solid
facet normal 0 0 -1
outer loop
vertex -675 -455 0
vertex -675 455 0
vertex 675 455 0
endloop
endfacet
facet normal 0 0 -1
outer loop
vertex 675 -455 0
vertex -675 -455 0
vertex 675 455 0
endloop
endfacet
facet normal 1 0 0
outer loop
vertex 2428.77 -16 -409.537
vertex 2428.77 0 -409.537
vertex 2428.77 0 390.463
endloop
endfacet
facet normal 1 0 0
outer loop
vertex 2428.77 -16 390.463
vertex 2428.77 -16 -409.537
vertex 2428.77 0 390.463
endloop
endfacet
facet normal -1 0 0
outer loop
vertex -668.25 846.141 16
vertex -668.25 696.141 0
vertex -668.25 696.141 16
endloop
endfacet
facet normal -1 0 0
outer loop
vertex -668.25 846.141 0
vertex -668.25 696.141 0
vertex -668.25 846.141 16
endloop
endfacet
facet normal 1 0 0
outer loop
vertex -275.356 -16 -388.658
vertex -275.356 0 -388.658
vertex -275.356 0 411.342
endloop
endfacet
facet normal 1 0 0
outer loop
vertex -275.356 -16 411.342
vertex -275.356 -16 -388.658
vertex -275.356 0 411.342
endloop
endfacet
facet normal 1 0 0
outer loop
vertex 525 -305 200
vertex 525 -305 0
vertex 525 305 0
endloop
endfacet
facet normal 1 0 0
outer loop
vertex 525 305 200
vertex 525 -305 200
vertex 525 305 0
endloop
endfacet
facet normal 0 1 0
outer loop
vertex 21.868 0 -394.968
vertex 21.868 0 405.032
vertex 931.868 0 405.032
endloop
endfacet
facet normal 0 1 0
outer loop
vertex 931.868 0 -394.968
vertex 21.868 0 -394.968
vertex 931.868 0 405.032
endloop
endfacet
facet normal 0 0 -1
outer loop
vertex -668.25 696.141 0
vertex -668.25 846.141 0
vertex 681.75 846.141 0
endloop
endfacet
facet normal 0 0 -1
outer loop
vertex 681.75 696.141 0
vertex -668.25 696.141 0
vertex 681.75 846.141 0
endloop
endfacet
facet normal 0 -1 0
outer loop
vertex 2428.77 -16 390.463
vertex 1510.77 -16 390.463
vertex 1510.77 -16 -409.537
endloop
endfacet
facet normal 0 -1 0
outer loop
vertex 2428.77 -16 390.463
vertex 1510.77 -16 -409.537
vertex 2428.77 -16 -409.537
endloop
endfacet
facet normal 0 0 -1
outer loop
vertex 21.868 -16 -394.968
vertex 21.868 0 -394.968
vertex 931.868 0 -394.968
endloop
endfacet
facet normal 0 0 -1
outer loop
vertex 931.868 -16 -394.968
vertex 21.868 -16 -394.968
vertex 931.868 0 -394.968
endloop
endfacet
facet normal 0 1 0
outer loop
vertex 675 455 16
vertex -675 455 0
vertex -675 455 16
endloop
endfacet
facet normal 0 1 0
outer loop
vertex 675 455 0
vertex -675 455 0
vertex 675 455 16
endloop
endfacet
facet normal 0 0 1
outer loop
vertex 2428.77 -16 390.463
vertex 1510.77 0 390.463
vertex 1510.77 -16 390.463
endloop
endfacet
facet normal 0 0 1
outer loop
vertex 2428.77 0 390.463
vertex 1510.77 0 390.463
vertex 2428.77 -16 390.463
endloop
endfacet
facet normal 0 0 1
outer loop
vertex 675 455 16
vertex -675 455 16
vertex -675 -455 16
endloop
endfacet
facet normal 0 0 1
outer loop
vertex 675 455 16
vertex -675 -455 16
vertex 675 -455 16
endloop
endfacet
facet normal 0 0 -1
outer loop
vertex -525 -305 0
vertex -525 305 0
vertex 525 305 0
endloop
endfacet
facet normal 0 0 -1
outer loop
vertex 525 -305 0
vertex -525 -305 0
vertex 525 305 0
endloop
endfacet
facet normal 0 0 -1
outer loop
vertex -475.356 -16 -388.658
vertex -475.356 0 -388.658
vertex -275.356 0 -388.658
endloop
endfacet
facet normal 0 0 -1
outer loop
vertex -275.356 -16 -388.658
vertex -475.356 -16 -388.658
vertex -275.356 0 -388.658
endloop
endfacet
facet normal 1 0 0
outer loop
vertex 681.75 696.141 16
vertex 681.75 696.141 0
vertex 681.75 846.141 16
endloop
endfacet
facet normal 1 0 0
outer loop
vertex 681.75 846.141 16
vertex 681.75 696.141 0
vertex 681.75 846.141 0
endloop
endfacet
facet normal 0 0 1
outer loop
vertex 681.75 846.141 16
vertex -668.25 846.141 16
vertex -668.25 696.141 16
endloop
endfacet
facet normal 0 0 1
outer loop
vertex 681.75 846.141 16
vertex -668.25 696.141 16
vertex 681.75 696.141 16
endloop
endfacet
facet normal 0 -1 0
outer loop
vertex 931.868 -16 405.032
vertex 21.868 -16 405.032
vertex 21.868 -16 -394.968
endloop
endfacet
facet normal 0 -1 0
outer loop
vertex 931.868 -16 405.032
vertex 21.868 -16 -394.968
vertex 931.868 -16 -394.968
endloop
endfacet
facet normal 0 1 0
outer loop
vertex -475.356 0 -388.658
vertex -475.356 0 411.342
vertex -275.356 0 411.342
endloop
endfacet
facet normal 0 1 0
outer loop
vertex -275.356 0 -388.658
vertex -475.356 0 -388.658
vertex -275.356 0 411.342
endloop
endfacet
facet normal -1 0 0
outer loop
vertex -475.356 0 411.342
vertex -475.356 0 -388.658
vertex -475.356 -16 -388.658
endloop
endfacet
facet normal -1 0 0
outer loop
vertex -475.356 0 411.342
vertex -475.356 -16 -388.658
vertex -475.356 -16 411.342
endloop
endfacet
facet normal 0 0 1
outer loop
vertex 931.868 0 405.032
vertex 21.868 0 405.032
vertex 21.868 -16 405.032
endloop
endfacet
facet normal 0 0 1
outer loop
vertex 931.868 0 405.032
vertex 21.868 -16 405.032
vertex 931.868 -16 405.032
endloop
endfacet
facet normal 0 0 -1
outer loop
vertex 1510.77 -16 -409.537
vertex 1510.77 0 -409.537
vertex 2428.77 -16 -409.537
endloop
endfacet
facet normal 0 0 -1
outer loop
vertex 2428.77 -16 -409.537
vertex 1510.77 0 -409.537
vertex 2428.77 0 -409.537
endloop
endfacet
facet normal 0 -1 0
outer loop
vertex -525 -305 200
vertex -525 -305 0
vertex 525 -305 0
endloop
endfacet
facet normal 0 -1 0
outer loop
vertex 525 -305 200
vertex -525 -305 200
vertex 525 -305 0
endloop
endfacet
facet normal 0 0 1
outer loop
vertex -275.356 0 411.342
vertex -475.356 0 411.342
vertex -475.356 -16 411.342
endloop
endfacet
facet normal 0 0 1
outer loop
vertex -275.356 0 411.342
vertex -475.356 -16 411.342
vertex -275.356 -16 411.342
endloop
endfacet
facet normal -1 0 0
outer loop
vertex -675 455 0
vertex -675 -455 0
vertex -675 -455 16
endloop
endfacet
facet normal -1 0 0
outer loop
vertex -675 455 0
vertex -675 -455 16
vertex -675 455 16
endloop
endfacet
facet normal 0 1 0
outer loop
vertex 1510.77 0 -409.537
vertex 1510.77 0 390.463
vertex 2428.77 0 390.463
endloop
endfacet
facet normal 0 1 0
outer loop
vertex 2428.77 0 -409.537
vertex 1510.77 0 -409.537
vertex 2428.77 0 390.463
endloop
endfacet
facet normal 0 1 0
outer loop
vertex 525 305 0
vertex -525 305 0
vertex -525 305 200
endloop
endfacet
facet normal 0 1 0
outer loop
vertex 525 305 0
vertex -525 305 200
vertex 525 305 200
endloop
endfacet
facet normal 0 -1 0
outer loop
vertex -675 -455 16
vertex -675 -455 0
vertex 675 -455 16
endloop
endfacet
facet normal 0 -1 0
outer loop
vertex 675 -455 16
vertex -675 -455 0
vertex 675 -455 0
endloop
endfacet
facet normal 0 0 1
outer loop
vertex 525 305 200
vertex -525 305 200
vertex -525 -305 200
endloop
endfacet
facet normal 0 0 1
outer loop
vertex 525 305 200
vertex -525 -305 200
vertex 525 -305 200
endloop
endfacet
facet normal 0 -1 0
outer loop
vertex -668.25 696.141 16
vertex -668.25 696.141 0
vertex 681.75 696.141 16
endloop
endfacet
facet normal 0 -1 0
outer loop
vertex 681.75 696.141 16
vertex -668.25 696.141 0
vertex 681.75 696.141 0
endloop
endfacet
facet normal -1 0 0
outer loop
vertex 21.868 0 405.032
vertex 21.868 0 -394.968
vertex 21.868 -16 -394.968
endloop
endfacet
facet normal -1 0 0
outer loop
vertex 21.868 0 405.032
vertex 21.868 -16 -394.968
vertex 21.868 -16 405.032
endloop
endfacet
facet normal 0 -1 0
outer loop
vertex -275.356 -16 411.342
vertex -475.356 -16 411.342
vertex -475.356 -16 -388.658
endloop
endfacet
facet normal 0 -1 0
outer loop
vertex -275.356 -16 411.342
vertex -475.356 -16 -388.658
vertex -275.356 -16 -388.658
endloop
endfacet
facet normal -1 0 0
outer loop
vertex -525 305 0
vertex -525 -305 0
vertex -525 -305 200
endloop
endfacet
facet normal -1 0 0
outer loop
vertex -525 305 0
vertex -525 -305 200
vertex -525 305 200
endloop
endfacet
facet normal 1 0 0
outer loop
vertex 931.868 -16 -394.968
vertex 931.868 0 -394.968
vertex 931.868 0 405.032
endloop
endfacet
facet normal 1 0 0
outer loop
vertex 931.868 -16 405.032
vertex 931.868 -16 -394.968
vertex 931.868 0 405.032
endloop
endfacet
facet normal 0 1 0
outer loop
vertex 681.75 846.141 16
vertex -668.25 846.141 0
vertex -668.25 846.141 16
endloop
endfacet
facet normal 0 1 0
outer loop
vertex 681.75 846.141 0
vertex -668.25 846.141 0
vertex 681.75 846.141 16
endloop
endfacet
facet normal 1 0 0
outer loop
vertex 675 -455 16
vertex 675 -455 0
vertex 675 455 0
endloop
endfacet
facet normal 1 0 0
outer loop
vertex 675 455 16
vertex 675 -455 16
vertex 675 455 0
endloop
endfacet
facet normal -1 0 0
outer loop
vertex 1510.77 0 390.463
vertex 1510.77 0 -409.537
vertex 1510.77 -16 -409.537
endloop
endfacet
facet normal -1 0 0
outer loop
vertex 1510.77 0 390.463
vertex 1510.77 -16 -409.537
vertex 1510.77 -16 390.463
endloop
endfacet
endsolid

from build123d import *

# Parameters (mm, degrees)
F1_W     = 1350
F1_H     = 150
F2_DEPTH = 16
F1_H_2   = 910
F1_W_2   = 1050
F1_H_3   = 610
F3_DEPTH = 16
F4_W     = 200
F4_H     = 800
F5_DEPTH = 16
F4_W_2   = 910
F6_DEPTH = 16
F4_W_3   = 918
F7_DEPTH = 16
F8_DEPTH = 200


with BuildPart() as f2:
    # F1 (on Top) → F2 (new body)
    with BuildSketch(Plane.XY):
        with Locations((6.7500948906, 771.1411237717)):
            Rectangle(F1_W, F1_H)
    extrude(amount=F2_DEPTH)


with BuildPart() as f3:
    # F1 (on Top) → F3 (new body)
    with BuildSketch(Plane.XY):
        Rectangle(F1_W, F1_H_2)
        Rectangle(F1_W_2, F1_H_3, mode=Mode.SUBTRACT)
        Rectangle(F1_W_2, F1_H_3)
    extrude(amount=F3_DEPTH)


with BuildPart() as f5:
    # F4 (on Front) → F5 (new body)
    with BuildSketch(Plane.XZ):
        with Locations((-375.3559490335, 11.3419480622)):
            Rectangle(F4_W, F4_H)
    extrude(amount=F5_DEPTH)


with BuildPart() as f6:
    # F4 (on Front) → F6 (new body)
    with BuildSketch(Plane.XZ):
        with Locations((476.867942065, 5.0315797329)):
            Rectangle(F4_W_2, F4_H)
    extrude(amount=F6_DEPTH)


with BuildPart() as f7:
    # F4 (on Front) → F7 (new body)
    with BuildSketch(Plane.XZ):
        with Locations((1969.770201683, -9.5369577408)):
            Rectangle(F4_W_3, F4_H)
    extrude(amount=F7_DEPTH)


with BuildPart() as f8:
    # F1 (on Top) → F8 (new body)
    with BuildSketch(Plane.XY):
        Rectangle(F1_W_2, F1_H_3)
    extrude(amount=F8_DEPTH)


solid = Compound([f2.part, f3.part, f5.part, f6.part, f7.part, f8.part])
